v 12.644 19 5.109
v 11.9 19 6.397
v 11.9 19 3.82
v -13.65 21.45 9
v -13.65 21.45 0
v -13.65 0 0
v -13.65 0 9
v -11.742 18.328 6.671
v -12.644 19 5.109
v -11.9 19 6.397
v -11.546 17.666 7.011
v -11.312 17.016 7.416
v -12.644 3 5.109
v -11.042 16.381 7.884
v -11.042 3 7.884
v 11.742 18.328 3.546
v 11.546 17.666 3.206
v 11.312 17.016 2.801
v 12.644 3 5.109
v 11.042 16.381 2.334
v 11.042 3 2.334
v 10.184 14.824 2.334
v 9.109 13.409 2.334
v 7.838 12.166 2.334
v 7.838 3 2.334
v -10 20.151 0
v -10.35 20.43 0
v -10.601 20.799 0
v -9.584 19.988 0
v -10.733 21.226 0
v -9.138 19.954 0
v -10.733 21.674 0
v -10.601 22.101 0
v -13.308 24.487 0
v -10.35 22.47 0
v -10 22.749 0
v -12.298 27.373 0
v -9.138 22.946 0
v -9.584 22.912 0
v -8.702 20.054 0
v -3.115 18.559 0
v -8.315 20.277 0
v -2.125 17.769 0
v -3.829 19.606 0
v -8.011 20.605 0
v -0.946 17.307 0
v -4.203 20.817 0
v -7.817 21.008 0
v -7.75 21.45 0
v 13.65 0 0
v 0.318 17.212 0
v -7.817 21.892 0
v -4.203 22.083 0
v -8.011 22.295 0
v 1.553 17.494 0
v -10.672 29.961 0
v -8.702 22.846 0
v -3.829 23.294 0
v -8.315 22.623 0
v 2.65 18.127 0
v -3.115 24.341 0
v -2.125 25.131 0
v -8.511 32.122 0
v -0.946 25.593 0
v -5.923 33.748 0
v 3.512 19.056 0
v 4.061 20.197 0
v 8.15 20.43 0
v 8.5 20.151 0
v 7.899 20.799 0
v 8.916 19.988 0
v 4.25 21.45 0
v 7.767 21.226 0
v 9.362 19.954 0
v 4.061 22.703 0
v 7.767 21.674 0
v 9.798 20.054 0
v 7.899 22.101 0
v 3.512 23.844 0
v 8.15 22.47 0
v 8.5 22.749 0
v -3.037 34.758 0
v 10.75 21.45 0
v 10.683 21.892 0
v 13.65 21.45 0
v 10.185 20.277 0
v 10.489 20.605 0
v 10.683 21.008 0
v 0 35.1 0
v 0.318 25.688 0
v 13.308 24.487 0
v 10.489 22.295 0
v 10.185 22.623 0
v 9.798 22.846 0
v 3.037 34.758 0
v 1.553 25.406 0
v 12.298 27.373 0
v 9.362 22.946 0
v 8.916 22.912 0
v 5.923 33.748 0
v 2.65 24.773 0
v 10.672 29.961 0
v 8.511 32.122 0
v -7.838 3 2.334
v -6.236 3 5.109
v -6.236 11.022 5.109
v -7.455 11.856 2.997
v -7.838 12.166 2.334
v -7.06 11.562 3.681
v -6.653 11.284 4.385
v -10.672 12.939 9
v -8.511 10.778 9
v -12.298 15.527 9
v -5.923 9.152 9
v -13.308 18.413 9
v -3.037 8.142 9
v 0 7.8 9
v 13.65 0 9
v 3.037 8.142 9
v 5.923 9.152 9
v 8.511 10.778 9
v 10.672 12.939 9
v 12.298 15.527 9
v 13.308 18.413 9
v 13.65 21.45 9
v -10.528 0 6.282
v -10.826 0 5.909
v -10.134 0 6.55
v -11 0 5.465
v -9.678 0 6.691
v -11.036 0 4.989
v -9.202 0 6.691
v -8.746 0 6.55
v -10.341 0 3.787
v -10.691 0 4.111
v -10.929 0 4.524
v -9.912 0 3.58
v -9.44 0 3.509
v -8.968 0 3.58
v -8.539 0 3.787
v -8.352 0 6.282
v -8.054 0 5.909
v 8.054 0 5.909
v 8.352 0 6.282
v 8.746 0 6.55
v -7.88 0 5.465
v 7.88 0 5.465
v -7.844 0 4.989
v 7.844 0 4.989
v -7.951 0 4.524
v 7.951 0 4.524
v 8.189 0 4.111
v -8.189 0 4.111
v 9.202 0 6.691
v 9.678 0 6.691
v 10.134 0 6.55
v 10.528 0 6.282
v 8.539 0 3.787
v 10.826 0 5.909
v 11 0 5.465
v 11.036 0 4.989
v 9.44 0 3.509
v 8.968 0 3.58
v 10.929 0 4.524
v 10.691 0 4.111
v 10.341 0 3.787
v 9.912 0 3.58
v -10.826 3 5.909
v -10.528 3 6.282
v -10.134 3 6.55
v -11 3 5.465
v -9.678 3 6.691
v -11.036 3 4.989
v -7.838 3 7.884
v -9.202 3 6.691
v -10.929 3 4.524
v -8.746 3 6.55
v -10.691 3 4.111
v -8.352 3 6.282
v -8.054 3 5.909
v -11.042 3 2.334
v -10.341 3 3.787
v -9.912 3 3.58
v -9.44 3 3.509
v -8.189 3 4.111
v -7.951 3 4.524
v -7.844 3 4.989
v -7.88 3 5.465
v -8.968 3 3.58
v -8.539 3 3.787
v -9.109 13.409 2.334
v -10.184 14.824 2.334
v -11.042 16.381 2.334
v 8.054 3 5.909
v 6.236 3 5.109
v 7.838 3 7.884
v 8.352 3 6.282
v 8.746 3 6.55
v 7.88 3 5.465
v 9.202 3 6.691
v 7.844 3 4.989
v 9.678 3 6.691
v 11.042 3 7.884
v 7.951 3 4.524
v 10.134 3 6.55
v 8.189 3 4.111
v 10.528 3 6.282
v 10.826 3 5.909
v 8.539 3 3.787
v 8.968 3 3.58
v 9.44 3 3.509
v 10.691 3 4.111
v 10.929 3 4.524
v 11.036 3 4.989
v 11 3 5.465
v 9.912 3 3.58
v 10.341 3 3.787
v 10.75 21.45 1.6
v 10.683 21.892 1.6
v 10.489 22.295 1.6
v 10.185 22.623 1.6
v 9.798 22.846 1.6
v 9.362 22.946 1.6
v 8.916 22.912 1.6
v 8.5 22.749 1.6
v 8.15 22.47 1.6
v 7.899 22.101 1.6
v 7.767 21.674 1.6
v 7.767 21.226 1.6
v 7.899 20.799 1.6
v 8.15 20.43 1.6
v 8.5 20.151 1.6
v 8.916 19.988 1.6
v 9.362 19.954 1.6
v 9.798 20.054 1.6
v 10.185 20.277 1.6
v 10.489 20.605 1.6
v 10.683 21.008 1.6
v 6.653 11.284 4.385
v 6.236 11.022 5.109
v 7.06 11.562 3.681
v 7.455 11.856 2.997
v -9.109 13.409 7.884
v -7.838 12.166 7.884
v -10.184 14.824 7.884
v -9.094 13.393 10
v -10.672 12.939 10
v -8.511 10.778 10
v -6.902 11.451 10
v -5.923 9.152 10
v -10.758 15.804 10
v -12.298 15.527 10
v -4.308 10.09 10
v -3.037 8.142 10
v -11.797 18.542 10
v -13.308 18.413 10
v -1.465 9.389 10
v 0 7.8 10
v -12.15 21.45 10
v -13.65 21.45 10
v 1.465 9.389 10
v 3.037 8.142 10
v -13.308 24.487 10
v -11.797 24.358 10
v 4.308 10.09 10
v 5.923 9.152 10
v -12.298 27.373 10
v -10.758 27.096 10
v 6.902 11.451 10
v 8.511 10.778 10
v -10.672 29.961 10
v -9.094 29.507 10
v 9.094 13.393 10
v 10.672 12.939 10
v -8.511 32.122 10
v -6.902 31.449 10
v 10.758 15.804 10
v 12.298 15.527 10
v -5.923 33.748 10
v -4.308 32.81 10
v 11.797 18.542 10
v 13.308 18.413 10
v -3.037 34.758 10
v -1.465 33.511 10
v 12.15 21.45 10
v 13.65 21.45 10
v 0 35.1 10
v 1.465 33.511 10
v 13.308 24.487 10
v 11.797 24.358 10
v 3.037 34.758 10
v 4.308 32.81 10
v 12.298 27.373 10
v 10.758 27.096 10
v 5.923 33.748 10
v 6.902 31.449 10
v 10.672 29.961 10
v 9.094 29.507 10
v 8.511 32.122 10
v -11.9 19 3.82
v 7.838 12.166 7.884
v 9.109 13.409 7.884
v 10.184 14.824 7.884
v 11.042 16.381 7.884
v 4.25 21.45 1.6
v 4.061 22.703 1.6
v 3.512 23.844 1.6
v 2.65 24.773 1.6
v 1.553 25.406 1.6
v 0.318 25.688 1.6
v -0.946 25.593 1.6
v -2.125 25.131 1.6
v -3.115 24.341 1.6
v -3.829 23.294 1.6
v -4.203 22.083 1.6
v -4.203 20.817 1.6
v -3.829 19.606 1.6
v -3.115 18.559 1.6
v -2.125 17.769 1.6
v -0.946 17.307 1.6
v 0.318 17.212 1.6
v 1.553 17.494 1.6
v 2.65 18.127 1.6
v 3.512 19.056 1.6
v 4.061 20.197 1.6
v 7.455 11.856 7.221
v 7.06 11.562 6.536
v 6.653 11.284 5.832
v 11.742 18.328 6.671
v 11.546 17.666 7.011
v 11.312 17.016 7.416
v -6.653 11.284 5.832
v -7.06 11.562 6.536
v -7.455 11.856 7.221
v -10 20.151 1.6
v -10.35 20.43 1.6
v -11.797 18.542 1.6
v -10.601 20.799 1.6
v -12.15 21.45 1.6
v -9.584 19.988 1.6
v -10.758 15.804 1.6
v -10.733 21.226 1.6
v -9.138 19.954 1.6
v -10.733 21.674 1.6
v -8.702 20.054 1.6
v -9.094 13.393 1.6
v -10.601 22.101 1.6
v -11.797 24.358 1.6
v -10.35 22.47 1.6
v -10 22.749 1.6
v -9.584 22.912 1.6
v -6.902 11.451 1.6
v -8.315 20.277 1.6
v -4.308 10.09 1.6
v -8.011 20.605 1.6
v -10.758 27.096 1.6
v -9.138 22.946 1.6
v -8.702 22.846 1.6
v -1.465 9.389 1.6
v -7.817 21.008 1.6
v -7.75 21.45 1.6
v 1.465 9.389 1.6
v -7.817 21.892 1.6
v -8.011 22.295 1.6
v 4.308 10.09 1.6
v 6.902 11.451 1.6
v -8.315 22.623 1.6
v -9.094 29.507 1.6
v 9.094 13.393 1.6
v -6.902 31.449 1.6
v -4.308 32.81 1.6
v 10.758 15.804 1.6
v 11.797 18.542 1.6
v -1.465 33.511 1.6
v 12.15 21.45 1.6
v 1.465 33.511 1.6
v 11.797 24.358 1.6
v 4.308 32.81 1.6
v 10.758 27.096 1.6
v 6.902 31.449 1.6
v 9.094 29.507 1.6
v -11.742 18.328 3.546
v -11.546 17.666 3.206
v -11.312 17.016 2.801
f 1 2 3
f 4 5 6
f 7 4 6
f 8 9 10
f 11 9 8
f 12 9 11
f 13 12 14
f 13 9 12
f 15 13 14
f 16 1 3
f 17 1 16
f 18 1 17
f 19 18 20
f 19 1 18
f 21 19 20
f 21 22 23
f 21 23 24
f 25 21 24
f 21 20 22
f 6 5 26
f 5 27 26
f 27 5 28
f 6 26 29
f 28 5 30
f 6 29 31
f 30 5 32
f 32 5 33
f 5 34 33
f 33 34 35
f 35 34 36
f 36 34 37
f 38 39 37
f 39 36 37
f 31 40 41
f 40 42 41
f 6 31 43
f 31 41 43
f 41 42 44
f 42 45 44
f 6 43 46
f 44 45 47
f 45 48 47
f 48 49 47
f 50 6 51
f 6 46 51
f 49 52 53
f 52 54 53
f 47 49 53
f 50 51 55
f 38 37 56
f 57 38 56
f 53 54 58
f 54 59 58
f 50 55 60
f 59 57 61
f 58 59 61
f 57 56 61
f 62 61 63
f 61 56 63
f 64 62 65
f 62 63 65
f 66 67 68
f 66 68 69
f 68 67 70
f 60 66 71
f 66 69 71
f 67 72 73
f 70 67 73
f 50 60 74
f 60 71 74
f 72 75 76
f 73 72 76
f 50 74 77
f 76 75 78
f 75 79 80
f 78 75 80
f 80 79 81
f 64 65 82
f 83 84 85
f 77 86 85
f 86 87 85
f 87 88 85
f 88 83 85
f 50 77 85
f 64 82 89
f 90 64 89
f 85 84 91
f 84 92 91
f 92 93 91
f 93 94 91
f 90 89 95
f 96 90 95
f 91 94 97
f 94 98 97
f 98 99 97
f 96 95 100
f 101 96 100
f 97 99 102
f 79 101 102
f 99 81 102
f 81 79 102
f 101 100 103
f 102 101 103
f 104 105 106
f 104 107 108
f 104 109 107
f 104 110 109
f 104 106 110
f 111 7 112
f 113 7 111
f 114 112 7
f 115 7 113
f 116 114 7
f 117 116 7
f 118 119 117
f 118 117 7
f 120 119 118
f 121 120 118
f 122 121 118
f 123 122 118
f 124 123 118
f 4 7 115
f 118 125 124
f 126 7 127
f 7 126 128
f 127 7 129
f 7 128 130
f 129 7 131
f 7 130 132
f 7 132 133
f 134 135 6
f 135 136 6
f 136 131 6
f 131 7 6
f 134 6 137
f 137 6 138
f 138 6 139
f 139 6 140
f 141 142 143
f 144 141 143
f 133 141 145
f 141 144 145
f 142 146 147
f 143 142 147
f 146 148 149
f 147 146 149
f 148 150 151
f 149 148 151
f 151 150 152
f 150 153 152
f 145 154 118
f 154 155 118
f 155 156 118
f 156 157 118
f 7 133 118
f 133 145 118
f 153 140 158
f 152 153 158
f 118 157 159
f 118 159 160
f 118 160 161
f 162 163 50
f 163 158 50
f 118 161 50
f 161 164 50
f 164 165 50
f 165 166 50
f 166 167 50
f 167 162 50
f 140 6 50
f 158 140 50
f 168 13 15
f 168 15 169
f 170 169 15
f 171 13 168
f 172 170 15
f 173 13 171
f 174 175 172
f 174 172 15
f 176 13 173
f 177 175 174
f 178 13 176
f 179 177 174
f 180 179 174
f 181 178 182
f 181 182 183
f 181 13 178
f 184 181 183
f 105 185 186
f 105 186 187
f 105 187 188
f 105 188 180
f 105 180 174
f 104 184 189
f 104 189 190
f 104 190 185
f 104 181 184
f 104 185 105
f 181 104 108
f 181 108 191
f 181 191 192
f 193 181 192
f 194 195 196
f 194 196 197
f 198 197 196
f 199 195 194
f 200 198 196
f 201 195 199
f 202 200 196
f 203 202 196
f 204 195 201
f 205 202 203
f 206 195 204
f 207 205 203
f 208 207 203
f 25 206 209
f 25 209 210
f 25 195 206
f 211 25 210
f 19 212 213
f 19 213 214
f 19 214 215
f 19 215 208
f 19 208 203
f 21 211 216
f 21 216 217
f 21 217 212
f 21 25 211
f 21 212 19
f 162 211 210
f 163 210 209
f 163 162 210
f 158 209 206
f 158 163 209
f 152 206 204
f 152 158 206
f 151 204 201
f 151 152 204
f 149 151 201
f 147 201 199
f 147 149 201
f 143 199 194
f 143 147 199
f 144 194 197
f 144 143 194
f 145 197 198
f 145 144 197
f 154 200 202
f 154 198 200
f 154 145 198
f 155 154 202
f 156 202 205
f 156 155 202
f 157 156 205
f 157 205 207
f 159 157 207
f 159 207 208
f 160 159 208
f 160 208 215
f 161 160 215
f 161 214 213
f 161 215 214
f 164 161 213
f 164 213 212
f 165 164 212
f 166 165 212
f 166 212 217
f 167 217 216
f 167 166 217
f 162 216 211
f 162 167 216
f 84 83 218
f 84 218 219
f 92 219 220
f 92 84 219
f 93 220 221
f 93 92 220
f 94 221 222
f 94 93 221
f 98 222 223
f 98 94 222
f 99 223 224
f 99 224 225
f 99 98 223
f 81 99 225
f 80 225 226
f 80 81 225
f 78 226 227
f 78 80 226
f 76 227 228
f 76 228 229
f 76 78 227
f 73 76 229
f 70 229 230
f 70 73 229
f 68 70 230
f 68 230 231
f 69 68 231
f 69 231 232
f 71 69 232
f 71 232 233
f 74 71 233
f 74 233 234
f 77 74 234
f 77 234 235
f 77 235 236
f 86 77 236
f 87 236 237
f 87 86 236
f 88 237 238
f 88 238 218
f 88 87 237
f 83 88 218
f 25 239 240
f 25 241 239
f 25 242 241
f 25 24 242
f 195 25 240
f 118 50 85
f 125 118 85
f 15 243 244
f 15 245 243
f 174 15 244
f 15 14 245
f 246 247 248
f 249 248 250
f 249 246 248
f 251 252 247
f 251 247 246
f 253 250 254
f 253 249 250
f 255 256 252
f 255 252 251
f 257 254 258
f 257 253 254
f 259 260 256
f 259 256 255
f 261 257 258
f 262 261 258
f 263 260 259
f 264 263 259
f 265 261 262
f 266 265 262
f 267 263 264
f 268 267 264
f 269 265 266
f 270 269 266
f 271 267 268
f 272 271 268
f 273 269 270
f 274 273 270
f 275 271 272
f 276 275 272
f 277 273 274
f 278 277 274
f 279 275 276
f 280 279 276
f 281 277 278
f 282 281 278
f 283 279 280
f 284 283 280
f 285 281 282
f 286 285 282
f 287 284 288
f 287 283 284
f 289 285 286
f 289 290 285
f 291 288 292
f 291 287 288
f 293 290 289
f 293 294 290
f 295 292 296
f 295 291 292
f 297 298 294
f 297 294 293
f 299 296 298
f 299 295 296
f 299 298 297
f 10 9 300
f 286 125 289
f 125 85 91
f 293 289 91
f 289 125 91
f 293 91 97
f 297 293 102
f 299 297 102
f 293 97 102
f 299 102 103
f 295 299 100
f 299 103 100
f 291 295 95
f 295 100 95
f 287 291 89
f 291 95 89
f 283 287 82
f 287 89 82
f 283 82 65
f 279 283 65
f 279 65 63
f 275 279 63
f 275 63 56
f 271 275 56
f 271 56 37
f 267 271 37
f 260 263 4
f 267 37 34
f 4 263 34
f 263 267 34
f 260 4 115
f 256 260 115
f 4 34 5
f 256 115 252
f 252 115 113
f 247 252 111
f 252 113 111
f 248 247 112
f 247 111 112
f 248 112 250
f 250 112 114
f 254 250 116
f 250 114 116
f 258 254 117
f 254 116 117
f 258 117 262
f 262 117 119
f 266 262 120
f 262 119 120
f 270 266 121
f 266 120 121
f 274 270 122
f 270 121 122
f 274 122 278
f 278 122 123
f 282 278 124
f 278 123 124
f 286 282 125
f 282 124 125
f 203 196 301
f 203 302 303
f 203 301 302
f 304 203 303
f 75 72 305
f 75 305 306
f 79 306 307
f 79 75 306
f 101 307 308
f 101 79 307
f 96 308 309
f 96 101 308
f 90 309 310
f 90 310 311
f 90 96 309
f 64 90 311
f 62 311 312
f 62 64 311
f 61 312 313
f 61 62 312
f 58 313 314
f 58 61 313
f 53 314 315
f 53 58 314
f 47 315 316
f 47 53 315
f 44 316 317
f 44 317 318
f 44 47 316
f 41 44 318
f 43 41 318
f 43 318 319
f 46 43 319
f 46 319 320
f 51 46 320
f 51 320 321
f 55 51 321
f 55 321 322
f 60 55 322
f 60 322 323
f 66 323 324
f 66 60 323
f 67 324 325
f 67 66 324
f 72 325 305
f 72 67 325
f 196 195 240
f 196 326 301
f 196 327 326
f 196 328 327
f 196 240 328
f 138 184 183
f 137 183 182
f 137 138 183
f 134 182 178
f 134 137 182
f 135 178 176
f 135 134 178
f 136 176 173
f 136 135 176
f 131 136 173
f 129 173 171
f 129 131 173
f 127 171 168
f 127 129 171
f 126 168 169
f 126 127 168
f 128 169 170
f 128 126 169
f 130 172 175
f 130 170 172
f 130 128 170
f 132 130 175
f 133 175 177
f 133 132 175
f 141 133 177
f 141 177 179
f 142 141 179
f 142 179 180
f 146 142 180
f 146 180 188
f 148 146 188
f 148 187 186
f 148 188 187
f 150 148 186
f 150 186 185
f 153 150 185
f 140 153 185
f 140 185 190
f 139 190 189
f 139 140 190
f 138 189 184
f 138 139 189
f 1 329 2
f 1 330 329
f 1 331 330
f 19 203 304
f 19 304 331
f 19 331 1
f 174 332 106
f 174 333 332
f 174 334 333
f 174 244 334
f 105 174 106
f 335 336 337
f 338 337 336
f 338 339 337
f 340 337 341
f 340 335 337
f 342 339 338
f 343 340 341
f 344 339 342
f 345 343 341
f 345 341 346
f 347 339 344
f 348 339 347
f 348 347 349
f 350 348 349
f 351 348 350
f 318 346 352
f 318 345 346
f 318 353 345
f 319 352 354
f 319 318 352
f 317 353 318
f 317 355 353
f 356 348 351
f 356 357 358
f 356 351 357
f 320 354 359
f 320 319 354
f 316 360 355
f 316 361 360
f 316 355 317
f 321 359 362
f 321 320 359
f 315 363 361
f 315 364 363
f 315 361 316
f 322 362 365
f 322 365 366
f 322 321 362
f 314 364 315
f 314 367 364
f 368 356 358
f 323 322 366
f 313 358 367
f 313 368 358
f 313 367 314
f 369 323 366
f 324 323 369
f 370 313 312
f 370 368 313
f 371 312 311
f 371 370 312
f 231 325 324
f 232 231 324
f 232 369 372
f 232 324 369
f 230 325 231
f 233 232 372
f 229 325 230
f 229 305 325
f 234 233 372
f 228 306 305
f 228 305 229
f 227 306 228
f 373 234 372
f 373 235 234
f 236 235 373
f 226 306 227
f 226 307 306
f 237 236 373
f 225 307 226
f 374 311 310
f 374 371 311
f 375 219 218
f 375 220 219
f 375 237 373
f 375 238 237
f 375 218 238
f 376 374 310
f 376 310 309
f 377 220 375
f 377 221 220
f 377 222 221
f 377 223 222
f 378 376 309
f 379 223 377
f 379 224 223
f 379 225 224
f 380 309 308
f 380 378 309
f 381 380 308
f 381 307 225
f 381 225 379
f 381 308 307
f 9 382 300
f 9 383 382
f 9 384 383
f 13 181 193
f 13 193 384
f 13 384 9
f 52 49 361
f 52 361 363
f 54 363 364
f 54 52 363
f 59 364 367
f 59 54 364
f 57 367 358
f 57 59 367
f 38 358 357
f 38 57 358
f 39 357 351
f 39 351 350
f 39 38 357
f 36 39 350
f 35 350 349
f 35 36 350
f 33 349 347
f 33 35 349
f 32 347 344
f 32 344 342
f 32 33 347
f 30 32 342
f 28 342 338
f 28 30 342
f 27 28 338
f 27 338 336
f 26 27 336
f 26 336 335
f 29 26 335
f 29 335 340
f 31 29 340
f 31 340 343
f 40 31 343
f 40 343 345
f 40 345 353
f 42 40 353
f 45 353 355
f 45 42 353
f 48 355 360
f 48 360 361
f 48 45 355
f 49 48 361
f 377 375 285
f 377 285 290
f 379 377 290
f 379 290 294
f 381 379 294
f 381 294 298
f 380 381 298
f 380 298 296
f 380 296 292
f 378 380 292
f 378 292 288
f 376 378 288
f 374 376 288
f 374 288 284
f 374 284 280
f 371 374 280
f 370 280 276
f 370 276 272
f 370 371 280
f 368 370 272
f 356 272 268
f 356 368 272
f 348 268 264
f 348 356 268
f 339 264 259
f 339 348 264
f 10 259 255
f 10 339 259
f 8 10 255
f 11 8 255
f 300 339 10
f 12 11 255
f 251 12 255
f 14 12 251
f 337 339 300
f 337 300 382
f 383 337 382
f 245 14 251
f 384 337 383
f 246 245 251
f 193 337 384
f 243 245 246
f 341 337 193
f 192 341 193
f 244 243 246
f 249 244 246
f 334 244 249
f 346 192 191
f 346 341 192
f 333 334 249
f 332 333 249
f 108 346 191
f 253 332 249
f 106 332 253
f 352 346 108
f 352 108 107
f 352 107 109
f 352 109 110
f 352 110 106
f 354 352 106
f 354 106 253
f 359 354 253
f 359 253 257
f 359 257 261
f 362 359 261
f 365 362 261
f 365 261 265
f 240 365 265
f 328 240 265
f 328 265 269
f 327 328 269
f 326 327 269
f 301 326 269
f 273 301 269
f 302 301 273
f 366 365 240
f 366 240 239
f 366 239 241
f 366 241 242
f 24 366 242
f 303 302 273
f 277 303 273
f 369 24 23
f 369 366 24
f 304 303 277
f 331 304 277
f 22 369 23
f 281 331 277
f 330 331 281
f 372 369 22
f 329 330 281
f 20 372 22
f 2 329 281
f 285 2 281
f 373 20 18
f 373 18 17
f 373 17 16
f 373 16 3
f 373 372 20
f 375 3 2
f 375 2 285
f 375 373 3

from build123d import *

# Parameters (mm, degrees)
SKETCH1_R           = 13.65
SKETCH1_R_2         = 12.15
BOSS_EXTRUDE1_DEPTH = 10
SKETCH1_4_R         = 12.15
SKETCH1_4_R_2       = 1.5
SKETCH1_4_R_3       = 4.25
BOSS_EXTRUDE2_DEPTH = 1.6
BOSS_EXTRUDE3_DEPTH = 9
SKETCH3_R           = 1.6
CUT_EXTRUDE1_DEPTH  = 18
CUT_EXTRUDE2_START  = 3
CUT_EXTRUDE2_DEPTH  = 16


with BuildPart() as part:
    # Sketch1 → Boss-Extrude1 (new body)
    with BuildSketch(Plane.XY):
        with Locations((0, 21.45)):
            Circle(SKETCH1_R)
        with Locations((0, 21.45)):
            Circle(SKETCH1_R_2, mode=Mode.SUBTRACT)
    extrude(amount=BOSS_EXTRUDE1_DEPTH)

    # Sketch1<4> → Boss-Extrude2 (add)
    with BuildSketch(Plane.XY):
        with Locations((0, 21.45)):
            Circle(SKETCH1_4_R)
        with Locations((-9.25, 21.45)):
            Circle(SKETCH1_4_R_2, mode=Mode.SUBTRACT)
        with Locations((9.25, 21.45)):
            Circle(SKETCH1_4_R_2, mode=Mode.SUBTRACT)
        with Locations((0, 21.45)):
            Circle(SKETCH1_4_R_3, mode=Mode.SUBTRACT)
    extrude(amount=BOSS_EXTRUDE2_DEPTH)

    # Sketch2 → Boss-Extrude3 (add)
    with BuildSketch(Plane.XY):
        with BuildLine():
            Line((-13.65, 21.45), (-13.65, 0))
            Line((-13.65, 0), (13.65, 0))
            Line((13.65, 0), (13.65, 21.45))
            ThreePointArc((13.65, 21.45), (0, 7.8), (-13.65, 21.45))
        make_face()
    extrude(amount=BOSS_EXTRUDE3_DEPTH)

    # Sketch3 → Cut-Extrude1 (cut)
    with BuildSketch(Plane(origin=(0, 0, 0), x_dir=(1, 0, 0), z_dir=(0, 1, 0))):
        with Locations(Location((-9.44, -5.108703369, 0), (0, 0, 90))):
            Circle(SKETCH3_R)
        with Locations(Location((9.44, -5.108703369, 0), (0, 0, 90))):
            Circle(SKETCH3_R)
    extrude(amount=CUT_EXTRUDE1_DEPTH, mode=Mode.SUBTRACT)

    # Sketch4 → Cut-Extrude2 (cut)
    with BuildSketch(Plane(origin=(0, 0, 0), x_dir=(1, 0, 0), z_dir=(0, 1, 0)).offset(CUT_EXTRUDE2_START)):
        Polygon((-7.837853003, -2.333703369), (-11.042146997, -2.333703369), (-12.644293994, -5.108703369), (-11.042146997, -7.883703369), (-7.837853003, -7.883703369), (-6.235706006, -5.108703369), align=None)
        Polygon((11.042146997, -2.333703369), (7.837853003, -2.333703369), (6.235706006, -5.108703369), (7.837853003, -7.883703369), (11.042146997, -7.883703369), (12.644293994, -5.108703369), align=None)
    extrude(amount=CUT_EXTRUDE2_DEPTH, mode=Mode.SUBTRACT)


solid = part.part
